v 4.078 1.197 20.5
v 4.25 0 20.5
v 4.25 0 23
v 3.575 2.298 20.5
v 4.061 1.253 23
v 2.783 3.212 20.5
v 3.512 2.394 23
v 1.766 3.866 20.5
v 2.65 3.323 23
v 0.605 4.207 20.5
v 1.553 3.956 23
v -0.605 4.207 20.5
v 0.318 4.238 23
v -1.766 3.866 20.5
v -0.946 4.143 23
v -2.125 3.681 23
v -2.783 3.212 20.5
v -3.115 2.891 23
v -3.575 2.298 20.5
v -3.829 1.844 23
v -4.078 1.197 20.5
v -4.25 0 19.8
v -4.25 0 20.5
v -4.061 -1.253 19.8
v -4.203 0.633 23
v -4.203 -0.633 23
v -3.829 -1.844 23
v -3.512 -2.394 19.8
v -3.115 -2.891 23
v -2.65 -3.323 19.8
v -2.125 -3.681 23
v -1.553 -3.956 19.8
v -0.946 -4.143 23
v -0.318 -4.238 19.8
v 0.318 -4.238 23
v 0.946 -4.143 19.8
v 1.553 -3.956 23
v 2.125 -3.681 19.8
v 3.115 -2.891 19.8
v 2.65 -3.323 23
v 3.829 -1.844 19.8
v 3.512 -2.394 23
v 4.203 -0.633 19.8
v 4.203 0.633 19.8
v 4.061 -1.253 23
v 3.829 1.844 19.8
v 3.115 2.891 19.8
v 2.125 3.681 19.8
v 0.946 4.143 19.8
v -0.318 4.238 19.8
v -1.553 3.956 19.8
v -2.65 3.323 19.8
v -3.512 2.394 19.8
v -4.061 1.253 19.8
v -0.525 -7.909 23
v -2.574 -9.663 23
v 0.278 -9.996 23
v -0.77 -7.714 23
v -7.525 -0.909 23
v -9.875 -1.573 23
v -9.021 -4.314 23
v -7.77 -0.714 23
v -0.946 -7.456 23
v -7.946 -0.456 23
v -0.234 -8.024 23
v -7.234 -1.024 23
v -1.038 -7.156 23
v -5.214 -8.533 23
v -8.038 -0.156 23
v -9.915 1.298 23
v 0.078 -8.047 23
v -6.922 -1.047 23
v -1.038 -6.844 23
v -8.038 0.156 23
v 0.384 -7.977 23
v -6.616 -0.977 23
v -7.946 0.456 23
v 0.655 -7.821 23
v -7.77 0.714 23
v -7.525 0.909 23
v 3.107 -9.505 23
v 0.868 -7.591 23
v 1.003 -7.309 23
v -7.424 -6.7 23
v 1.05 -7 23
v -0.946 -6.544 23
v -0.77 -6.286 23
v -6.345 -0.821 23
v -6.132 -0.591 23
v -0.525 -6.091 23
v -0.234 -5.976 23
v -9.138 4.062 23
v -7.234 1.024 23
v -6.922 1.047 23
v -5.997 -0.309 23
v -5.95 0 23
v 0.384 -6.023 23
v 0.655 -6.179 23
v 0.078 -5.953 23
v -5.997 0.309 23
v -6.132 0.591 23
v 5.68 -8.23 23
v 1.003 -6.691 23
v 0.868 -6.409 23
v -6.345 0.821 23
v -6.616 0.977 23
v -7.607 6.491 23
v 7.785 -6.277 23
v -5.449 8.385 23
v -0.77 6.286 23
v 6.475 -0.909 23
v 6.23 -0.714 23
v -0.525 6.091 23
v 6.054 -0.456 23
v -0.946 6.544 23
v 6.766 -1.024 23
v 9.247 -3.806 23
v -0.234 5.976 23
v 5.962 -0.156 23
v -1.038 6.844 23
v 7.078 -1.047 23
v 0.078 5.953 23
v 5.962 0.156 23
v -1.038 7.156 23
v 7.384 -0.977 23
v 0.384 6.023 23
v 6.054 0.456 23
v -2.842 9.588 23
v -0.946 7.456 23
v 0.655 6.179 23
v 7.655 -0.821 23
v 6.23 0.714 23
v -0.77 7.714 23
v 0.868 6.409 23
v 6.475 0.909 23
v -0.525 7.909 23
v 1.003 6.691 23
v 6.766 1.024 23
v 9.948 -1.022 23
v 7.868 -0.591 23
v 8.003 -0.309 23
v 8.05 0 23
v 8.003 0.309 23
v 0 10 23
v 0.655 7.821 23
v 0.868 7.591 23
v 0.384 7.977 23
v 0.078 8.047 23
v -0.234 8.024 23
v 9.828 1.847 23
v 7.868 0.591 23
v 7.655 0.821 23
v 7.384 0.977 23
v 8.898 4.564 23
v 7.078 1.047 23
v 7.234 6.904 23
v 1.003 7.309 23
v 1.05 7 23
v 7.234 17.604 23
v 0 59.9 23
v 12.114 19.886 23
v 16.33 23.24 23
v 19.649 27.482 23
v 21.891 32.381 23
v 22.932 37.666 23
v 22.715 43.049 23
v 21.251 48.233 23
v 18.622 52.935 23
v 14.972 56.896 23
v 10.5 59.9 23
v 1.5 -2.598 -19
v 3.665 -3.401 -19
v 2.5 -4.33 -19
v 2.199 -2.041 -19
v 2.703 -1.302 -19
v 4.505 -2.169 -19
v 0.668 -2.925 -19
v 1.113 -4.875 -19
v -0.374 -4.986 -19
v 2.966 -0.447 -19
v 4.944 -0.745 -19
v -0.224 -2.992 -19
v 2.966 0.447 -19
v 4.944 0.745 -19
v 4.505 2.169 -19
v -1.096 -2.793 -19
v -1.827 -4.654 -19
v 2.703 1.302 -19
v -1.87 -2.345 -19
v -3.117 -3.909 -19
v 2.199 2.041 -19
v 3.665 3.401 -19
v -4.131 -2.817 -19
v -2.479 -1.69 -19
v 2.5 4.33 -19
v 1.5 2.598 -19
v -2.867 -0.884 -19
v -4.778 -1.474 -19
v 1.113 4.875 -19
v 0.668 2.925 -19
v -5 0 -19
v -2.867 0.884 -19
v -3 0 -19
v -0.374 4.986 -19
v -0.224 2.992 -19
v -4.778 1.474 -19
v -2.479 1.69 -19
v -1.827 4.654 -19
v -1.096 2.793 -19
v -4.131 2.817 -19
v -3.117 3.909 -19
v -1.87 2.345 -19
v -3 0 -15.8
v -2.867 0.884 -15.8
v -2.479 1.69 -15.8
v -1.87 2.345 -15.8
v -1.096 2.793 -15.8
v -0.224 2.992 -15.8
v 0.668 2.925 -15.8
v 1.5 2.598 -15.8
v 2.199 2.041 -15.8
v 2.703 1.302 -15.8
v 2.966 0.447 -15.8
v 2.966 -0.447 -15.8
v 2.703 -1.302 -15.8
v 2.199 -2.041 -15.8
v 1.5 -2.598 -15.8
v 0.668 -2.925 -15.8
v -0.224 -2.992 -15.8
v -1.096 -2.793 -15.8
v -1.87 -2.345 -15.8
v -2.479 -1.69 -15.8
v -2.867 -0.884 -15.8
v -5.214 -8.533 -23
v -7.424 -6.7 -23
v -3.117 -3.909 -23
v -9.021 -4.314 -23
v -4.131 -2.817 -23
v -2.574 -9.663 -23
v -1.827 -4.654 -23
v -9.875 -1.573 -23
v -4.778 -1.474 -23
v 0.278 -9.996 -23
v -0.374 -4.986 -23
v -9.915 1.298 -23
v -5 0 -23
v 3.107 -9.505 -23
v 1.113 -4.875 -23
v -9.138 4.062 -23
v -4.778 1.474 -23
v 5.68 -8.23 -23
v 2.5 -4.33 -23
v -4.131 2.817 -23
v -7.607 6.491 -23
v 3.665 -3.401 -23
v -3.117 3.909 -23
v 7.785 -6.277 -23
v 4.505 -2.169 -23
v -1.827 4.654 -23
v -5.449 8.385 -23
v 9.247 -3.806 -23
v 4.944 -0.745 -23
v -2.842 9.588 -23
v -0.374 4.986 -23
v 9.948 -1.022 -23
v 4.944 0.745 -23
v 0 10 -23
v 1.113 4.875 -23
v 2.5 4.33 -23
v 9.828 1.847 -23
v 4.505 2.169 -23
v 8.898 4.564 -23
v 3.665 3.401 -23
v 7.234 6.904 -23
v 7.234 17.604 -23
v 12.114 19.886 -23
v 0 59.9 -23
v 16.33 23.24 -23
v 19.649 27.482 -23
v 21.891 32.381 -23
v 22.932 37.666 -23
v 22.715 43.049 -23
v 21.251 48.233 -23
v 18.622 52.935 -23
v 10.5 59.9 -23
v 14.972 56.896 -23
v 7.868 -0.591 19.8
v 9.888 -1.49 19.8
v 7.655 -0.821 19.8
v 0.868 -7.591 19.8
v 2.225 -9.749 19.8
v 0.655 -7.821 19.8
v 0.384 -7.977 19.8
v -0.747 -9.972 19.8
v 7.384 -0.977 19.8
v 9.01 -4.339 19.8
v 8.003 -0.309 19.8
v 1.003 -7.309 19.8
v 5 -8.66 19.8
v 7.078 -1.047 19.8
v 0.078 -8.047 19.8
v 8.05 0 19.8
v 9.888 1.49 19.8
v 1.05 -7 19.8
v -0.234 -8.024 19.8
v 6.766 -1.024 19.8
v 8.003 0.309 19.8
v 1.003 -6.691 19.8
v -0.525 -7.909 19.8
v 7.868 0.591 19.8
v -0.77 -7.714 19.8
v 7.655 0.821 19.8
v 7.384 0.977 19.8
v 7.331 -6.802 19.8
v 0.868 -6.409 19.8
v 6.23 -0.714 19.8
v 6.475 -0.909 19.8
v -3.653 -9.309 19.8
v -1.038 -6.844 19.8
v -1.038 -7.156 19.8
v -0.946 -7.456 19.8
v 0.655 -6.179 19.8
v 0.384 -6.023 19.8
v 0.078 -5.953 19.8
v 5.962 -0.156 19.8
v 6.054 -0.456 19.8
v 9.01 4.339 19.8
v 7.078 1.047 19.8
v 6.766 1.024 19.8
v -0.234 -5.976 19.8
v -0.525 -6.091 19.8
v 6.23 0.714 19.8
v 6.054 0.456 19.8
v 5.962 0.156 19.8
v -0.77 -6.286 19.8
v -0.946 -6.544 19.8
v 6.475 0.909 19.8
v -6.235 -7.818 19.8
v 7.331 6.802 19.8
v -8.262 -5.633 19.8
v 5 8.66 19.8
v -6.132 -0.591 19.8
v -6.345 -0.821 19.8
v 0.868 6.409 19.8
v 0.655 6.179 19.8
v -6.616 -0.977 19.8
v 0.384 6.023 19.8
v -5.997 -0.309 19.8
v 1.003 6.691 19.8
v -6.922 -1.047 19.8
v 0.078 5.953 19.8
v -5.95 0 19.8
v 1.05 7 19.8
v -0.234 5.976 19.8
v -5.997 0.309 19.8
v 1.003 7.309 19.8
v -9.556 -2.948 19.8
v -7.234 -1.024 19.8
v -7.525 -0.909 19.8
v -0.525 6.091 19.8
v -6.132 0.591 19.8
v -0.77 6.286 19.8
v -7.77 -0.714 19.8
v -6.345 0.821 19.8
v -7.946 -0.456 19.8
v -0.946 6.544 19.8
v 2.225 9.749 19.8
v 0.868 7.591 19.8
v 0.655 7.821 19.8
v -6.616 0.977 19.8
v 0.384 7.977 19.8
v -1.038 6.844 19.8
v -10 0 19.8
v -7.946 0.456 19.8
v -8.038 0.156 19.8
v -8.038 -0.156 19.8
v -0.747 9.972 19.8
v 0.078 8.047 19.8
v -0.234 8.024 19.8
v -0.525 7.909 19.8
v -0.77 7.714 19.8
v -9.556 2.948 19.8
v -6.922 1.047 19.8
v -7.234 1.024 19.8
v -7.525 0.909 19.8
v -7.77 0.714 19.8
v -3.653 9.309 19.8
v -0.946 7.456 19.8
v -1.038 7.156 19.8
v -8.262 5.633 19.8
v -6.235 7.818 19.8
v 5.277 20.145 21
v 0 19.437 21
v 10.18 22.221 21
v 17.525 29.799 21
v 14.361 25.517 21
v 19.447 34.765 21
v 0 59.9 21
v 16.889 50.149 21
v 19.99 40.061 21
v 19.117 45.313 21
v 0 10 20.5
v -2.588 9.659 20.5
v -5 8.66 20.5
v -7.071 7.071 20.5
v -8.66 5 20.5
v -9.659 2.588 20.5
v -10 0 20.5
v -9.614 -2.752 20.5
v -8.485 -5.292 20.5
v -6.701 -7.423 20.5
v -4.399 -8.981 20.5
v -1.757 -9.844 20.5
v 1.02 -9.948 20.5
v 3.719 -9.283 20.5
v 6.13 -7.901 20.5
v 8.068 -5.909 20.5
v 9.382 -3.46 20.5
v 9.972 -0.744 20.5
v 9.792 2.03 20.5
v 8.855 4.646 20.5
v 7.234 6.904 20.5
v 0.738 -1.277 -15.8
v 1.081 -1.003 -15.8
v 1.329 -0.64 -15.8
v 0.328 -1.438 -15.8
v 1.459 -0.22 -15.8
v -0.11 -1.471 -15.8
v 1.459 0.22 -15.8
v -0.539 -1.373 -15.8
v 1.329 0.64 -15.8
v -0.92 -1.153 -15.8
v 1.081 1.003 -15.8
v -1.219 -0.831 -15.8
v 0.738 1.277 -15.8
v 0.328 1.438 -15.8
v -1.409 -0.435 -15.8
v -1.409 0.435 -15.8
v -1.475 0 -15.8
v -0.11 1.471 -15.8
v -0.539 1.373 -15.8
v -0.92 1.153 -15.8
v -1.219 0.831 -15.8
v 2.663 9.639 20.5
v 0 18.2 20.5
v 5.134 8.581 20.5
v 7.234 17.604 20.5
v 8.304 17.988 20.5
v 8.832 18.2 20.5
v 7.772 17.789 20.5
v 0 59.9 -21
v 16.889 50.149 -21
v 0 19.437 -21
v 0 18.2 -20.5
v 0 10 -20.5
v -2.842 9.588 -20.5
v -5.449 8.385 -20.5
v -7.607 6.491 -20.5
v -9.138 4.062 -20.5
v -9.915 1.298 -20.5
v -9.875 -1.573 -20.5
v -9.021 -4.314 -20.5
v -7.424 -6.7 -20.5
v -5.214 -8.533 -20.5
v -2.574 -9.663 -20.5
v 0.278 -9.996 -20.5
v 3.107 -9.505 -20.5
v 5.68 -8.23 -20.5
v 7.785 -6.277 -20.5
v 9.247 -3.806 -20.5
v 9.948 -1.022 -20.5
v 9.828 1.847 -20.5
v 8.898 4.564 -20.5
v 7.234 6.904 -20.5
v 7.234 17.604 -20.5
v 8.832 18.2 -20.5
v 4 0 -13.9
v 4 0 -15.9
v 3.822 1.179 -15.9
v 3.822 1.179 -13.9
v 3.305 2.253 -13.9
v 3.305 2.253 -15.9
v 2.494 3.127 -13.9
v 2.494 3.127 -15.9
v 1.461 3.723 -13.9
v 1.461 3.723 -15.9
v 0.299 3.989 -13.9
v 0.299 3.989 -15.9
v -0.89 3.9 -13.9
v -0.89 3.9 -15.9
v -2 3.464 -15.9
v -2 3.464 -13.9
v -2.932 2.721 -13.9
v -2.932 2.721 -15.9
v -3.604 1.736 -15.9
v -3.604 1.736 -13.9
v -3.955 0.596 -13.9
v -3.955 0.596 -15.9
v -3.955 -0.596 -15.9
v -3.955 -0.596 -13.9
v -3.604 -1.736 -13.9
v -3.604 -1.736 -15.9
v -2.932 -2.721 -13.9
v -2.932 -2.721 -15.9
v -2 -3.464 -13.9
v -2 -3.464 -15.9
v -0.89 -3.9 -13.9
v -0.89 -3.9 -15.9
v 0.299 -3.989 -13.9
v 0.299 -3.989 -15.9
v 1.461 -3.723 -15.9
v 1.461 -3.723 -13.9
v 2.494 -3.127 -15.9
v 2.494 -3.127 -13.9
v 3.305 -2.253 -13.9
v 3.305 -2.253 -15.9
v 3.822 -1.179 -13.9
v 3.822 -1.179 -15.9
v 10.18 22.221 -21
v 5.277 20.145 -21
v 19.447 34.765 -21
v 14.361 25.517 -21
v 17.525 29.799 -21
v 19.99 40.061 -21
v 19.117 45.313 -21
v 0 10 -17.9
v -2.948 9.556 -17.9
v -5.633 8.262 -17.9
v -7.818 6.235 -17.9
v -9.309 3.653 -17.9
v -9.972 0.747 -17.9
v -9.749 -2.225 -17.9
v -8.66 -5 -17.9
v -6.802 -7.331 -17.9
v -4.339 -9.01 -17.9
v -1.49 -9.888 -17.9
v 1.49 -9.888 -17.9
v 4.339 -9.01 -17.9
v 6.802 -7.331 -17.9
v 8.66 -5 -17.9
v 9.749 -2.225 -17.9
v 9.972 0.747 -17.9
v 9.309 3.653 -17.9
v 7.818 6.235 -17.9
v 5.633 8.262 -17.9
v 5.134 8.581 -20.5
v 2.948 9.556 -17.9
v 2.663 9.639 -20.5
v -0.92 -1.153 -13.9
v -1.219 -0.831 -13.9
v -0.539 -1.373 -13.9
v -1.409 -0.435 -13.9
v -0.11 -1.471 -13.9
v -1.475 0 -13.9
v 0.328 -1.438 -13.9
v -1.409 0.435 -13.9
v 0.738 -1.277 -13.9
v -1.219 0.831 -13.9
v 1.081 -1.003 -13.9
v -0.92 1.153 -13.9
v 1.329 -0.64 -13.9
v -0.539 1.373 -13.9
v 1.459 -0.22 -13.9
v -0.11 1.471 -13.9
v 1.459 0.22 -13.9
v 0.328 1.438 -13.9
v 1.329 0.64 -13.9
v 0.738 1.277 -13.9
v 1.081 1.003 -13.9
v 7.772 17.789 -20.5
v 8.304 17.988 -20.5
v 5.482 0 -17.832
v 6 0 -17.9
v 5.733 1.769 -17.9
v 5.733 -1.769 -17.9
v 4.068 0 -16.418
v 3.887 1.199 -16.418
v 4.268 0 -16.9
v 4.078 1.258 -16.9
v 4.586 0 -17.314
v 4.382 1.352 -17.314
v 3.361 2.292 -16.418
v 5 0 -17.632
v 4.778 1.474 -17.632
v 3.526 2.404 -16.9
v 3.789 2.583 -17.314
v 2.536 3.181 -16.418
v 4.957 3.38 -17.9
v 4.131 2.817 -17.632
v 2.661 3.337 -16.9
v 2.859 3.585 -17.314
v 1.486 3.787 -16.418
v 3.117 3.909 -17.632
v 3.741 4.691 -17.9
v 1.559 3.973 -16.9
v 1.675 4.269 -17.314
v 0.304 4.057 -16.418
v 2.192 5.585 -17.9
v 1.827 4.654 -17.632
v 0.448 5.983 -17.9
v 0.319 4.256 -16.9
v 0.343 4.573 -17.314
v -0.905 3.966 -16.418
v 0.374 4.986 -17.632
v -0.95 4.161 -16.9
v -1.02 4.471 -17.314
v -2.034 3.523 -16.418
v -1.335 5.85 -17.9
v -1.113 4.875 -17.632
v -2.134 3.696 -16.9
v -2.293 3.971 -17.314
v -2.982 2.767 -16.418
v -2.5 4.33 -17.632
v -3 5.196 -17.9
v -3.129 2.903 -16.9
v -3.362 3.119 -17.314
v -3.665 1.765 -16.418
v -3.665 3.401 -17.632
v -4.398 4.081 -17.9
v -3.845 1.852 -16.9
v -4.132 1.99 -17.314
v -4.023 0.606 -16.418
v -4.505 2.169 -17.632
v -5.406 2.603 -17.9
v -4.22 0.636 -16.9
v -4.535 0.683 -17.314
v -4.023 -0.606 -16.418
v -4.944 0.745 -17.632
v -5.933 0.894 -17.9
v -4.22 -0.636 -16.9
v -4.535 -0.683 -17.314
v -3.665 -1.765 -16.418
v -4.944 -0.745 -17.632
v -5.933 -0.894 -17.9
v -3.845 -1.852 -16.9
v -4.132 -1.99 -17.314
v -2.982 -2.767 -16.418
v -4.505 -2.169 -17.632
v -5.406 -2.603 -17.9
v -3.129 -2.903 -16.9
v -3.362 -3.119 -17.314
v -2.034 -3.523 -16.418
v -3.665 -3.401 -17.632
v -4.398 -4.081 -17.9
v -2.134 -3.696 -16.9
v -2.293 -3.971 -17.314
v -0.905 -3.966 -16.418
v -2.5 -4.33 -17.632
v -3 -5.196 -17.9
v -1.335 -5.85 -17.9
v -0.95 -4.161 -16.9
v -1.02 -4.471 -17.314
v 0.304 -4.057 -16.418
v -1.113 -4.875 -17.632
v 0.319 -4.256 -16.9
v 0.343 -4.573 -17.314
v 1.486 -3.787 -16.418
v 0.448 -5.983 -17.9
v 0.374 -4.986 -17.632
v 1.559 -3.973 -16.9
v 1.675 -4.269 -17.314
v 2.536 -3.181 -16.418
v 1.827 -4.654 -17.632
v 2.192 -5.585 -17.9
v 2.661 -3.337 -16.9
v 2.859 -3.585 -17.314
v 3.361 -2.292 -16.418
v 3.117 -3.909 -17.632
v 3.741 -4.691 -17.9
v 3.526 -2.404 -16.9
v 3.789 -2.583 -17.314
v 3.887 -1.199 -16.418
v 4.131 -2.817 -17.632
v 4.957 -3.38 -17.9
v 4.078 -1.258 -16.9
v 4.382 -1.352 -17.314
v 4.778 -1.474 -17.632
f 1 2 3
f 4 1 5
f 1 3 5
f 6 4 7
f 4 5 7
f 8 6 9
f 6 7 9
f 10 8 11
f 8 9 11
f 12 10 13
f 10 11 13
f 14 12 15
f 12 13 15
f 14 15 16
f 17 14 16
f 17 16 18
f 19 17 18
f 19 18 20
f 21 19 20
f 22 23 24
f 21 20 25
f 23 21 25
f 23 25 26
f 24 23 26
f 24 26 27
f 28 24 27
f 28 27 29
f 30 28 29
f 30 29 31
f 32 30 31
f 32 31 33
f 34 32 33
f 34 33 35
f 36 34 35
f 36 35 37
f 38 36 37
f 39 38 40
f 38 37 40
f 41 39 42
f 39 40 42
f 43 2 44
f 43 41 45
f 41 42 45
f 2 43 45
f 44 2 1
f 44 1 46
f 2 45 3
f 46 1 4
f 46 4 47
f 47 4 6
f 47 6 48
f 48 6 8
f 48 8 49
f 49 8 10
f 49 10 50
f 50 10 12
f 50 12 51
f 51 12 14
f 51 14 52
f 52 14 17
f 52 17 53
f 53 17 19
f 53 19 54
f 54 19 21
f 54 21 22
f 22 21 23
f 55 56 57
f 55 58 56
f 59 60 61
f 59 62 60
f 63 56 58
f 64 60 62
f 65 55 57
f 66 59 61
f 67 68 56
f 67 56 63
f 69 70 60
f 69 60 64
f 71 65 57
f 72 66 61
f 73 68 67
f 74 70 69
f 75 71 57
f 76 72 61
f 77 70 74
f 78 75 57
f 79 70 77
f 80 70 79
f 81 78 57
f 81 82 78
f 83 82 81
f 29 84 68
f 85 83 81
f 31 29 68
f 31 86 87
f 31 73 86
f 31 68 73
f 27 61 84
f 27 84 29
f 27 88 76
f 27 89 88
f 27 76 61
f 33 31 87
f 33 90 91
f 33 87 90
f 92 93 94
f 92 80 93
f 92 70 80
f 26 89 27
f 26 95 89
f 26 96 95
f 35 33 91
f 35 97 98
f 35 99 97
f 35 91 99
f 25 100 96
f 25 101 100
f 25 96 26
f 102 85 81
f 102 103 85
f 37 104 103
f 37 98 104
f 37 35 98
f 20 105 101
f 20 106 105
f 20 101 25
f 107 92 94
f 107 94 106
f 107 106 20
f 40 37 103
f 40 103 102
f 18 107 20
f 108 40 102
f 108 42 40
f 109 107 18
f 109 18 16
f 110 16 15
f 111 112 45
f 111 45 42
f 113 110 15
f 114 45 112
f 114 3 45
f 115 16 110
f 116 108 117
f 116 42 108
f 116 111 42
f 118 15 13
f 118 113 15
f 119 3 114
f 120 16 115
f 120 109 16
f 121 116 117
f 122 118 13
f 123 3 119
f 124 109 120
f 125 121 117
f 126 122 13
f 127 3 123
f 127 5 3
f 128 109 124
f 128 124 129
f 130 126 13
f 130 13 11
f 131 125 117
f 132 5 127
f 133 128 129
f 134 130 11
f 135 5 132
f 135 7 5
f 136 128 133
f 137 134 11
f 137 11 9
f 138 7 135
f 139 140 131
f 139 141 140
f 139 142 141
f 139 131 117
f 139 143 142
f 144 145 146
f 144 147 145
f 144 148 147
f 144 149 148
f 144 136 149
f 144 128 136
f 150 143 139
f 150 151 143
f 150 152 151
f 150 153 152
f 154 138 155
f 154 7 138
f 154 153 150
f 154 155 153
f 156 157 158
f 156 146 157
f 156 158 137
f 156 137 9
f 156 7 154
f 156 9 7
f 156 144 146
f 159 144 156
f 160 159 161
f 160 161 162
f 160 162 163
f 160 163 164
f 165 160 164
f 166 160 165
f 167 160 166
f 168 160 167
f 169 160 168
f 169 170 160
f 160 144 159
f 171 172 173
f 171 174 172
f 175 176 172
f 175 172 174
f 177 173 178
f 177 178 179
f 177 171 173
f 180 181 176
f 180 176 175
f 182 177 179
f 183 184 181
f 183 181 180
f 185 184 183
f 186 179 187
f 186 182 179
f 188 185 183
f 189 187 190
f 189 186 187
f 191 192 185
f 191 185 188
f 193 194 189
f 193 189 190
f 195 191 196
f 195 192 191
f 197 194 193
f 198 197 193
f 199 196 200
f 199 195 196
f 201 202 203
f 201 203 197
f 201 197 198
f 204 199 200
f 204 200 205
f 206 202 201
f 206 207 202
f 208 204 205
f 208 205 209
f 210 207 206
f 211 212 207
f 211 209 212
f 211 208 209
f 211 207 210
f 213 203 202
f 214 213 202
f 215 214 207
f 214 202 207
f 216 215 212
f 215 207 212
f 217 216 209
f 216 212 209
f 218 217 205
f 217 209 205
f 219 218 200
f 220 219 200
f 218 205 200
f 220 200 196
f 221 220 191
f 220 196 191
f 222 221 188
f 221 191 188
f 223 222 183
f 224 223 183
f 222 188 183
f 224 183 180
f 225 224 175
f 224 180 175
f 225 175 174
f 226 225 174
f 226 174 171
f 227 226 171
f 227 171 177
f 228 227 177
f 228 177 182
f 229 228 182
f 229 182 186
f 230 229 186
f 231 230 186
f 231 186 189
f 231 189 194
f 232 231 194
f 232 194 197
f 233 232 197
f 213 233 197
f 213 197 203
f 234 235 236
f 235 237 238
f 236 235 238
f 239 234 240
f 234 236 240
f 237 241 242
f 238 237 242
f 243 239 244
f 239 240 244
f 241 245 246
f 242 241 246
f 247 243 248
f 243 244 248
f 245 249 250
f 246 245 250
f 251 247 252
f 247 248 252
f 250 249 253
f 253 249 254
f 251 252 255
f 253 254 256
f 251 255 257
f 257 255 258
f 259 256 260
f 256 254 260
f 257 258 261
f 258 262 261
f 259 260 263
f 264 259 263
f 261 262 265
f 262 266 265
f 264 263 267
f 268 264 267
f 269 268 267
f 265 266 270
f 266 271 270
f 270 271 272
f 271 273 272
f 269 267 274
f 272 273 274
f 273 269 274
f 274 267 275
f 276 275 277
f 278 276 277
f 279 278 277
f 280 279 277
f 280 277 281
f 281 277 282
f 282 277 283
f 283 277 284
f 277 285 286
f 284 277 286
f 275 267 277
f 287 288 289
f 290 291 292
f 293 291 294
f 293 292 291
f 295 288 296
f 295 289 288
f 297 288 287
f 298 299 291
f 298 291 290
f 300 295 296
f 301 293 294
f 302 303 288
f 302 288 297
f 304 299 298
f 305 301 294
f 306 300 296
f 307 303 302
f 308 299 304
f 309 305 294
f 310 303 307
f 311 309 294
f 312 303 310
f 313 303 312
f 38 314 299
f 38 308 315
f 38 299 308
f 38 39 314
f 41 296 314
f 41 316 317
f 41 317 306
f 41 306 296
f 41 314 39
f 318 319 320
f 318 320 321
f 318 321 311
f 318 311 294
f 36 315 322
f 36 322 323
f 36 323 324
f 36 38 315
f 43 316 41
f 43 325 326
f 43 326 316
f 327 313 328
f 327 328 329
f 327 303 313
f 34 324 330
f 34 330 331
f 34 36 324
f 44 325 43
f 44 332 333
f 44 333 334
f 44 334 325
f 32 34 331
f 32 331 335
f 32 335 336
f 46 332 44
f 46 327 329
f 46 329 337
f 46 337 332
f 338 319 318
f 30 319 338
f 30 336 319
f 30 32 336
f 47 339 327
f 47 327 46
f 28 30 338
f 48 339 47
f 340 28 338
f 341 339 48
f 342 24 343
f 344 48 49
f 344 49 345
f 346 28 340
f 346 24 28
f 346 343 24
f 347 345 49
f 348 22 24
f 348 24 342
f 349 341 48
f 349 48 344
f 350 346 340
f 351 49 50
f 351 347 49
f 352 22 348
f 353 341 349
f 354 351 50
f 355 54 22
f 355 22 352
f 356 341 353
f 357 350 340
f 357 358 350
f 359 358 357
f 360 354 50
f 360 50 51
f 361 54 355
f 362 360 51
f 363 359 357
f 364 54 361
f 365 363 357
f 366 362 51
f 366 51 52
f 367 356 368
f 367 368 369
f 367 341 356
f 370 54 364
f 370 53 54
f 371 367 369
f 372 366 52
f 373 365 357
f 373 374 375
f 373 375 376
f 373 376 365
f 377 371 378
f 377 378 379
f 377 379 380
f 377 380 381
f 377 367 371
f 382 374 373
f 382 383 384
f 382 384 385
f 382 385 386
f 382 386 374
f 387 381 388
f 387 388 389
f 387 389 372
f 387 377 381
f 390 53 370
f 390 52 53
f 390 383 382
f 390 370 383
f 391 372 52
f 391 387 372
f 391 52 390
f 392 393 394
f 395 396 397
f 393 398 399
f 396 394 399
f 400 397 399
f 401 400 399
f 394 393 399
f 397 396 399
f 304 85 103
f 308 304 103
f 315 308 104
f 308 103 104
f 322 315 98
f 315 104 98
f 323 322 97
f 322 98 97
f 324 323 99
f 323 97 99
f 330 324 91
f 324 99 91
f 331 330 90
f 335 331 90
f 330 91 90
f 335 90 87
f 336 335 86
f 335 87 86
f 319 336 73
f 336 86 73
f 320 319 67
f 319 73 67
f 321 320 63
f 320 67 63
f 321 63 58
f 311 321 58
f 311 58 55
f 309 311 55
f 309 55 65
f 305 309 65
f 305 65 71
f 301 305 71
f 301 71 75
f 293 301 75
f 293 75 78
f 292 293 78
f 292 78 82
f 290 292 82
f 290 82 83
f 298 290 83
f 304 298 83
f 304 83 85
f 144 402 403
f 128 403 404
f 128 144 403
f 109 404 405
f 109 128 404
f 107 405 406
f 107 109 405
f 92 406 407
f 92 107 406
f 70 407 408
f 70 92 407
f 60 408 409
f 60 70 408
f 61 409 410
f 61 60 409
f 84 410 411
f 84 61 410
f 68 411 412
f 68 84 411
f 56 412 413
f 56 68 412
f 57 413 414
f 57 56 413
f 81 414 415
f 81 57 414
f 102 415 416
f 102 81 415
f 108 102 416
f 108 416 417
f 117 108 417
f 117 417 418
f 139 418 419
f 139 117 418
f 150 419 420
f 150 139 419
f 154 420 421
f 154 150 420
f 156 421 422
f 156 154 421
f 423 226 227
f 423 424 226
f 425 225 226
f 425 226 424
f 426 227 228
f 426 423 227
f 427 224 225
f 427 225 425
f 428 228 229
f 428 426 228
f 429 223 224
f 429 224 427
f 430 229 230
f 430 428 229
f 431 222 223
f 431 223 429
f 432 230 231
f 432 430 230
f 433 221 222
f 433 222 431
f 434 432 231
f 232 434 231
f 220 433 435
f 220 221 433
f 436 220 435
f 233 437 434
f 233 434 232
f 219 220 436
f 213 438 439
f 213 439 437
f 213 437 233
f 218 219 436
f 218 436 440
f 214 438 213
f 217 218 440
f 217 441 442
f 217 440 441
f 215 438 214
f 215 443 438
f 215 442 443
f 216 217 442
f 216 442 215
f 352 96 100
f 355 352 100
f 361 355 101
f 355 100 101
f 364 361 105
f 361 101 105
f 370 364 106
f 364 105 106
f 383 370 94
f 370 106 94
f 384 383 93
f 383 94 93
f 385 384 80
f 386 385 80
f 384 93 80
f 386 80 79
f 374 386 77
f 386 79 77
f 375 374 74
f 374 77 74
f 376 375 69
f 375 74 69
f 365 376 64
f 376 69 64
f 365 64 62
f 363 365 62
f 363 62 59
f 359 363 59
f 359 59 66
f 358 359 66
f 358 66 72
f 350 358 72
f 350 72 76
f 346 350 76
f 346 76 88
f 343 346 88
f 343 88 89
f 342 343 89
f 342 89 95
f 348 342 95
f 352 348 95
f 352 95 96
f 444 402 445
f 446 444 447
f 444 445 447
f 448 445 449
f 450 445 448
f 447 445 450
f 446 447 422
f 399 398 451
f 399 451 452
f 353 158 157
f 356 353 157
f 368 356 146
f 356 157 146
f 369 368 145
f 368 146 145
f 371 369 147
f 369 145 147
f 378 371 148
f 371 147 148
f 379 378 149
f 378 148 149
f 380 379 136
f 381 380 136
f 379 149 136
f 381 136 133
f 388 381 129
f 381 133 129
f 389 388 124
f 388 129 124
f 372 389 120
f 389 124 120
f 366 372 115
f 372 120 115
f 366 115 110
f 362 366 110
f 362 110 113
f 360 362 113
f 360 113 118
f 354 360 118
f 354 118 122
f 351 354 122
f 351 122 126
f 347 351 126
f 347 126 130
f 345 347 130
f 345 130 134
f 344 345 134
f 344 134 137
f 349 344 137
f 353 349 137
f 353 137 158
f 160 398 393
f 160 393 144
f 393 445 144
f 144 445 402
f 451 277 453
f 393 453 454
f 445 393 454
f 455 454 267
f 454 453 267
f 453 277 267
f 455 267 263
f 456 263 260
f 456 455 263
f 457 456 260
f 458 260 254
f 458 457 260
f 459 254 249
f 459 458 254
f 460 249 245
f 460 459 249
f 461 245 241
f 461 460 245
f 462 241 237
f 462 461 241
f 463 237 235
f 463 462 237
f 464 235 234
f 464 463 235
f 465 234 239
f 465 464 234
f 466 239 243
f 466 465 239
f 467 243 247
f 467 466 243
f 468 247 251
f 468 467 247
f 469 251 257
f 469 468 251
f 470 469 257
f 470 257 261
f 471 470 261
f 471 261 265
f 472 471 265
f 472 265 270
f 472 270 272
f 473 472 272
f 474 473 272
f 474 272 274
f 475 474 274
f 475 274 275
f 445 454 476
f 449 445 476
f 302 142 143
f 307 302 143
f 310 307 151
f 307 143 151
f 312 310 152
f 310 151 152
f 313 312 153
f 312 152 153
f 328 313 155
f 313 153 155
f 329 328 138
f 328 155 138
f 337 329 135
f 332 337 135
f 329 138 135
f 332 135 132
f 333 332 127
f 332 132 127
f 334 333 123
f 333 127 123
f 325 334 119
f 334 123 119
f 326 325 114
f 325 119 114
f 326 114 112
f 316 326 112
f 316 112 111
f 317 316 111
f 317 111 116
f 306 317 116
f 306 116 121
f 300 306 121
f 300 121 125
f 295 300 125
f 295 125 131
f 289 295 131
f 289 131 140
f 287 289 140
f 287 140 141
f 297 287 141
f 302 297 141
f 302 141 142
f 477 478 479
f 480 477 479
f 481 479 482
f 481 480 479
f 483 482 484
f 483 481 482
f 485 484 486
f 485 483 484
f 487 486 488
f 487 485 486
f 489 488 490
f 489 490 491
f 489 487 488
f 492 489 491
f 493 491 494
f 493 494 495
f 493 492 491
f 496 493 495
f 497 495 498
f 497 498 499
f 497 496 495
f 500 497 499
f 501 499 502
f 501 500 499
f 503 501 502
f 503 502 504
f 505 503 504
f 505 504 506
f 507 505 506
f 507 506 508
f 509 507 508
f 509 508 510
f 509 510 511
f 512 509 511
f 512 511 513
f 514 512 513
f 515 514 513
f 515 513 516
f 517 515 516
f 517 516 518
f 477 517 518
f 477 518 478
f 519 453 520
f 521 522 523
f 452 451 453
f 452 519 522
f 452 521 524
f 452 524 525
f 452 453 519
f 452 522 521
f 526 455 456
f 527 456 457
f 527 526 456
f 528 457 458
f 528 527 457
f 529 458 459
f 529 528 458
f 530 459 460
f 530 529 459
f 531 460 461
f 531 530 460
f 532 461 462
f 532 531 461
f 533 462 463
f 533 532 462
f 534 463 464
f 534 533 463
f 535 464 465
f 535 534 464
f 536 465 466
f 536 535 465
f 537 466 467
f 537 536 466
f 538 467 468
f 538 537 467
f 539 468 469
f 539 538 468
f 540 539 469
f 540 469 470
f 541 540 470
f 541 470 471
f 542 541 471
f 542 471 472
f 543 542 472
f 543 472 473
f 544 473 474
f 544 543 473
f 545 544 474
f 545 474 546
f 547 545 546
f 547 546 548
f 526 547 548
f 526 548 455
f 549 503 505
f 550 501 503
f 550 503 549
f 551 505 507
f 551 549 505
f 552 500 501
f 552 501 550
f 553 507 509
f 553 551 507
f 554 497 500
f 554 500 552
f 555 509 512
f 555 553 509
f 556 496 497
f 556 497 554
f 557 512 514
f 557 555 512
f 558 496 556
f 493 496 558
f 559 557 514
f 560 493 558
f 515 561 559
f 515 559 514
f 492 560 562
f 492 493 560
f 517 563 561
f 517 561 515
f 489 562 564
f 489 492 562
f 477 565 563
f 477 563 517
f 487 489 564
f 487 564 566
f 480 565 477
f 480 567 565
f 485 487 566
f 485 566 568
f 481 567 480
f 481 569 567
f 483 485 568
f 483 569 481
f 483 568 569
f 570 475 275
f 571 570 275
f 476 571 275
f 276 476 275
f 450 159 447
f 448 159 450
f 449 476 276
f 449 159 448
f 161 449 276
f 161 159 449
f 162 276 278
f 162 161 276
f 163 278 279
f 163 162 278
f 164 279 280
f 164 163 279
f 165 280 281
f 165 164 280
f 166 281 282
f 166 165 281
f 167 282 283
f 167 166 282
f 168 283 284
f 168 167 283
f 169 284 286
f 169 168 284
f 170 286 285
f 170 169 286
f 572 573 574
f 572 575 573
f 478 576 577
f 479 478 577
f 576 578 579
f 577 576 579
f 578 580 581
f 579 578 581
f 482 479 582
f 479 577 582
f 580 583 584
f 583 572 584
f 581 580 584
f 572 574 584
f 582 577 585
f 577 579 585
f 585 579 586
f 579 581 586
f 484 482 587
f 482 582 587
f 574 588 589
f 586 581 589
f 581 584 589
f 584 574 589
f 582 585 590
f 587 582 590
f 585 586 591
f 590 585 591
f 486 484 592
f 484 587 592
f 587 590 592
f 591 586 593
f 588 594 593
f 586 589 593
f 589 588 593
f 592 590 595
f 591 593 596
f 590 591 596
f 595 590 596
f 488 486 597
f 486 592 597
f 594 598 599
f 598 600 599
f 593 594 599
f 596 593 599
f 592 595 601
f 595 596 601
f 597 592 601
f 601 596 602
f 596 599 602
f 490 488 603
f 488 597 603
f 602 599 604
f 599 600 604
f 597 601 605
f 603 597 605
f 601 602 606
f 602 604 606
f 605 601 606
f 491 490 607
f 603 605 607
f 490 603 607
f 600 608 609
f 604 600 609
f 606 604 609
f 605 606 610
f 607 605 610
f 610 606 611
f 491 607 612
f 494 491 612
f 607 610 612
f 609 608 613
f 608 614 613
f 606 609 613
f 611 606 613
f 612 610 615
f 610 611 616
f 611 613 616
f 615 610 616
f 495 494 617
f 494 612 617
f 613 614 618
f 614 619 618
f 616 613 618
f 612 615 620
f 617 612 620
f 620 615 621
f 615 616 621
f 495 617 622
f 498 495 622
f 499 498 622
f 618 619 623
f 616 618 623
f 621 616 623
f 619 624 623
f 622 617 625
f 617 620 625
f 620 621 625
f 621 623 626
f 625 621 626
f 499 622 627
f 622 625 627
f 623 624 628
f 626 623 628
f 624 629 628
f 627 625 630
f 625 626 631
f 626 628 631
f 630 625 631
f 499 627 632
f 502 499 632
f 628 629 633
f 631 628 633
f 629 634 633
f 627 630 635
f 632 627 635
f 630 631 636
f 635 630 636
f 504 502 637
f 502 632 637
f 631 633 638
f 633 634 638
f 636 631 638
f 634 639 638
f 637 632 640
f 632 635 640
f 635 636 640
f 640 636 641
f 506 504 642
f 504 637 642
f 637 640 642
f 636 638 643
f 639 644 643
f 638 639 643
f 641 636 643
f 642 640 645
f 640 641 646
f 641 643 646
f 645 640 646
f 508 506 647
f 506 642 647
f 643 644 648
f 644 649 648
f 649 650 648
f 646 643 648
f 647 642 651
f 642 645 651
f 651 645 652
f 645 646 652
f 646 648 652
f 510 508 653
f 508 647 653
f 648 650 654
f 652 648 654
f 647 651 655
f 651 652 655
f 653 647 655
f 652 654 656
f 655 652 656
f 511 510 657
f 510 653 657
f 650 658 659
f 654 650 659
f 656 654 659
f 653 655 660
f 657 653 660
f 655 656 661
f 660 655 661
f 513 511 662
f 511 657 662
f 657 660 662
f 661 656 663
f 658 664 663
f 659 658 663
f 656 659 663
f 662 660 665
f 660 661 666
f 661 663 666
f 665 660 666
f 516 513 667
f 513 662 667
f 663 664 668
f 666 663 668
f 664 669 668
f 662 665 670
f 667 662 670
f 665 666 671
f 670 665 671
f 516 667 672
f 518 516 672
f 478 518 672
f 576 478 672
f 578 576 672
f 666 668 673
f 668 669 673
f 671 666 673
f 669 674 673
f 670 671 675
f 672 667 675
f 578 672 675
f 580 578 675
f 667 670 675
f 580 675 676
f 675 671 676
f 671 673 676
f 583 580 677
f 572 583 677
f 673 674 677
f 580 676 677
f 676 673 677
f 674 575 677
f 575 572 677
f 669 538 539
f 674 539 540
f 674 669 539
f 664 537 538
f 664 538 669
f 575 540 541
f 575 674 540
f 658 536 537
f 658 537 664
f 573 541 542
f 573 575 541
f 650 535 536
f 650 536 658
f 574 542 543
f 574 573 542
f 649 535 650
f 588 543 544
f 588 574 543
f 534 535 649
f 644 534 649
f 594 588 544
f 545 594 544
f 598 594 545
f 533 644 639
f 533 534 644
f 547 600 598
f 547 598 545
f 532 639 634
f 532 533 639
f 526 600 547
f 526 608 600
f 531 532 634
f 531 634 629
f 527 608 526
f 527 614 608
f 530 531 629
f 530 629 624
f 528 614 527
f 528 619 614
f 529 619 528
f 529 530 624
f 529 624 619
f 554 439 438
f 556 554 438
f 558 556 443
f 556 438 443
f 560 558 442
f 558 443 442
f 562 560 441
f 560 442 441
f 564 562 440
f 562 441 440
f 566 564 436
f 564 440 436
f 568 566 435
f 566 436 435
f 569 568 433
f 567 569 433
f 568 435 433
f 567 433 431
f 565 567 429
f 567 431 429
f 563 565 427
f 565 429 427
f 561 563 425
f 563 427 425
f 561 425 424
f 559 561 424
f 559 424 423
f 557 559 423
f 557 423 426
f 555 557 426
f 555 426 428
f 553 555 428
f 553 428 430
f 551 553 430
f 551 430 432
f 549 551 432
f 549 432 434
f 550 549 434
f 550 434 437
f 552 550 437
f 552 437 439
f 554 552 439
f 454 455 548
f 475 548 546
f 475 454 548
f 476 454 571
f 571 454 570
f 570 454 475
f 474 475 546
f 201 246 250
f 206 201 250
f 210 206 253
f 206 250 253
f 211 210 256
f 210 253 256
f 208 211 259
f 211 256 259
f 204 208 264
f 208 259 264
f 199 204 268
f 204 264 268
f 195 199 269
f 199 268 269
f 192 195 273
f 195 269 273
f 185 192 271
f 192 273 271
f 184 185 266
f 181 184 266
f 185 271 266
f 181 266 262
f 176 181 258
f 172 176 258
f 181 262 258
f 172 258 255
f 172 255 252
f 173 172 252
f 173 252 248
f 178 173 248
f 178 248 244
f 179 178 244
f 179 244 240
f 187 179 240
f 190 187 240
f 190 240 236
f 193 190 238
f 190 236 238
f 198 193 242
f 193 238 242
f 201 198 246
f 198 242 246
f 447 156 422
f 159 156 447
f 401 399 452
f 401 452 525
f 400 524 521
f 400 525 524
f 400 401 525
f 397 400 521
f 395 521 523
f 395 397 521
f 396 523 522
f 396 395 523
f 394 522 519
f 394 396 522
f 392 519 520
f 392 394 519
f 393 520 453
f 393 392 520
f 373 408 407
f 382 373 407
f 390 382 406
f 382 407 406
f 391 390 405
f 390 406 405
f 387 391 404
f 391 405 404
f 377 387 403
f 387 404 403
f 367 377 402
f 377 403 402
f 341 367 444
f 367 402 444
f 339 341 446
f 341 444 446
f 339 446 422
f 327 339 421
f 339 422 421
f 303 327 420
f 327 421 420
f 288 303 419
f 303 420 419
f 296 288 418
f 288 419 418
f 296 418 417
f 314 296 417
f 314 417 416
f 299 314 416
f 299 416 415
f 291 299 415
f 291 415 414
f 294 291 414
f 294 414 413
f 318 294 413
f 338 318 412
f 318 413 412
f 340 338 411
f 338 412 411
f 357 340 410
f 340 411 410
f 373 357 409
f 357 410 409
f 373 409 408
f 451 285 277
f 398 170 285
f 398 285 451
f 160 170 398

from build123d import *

# Parameters (mm, degrees)
BOSS_EXTRUDE1_DEPTH = 23
BOSS_EXTRUDE3_DEPTH = 2
SKETCH4_W           = 20
SKETCH4_H           = 41
CUT_EXTRUDE1_DEPTH  = 18.2
SKETCH5_R           = 10
SKETCH5_R_2         = 4.25
BOSS_EXTRUDE4_DEPTH = 0.7
CUT_EXTRUDE2_REACH  = 80.949
SKETCH6_R           = 1.05
SKETCH6_R_2         = 4.25
BOSS_EXTRUDE5_START = 6.1
SKETCH7_R           = 10
BOSS_EXTRUDE5_DEPTH = 6.1
SKETCH11_R          = 4
BOSS_EXTRUDE6_DEPTH = 0.5
SKETCH10_R          = 3
CUT_EXTRUDE4_DEPTH  = 7.2
CUT_EXTRUDE3_REACH  = 80.949
SKETCH9_R           = 1.475
SKETCH12_R          = 5
CUT_EXTRUDE5_DEPTH  = 4
SKETCH13_R          = 10
SKETCH13_R_2        = 4
CUT_EXTRUDE6_DEPTH  = 3.5
FILLET2_R           = 2


with BuildPart() as part:
    # Sketch1 → Boss-Extrude1 (new, symmetric)
    with BuildSketch(Plane.XY):
        with BuildLine():
            Line((0, 59.9), (16.889174661, 50.149030463))
            ThreePointArc((16.889174661, 50.149030463), (17.524957173, 29.799404984), (0, 19.43661807))
            Line((0, 19.43661807), (0, 10))
            ThreePointArc((0, 10), (-3.934485272, -9.193466465), (7.234311682, 6.903965128))
            Line((7.234311682, 6.903965128), (7.234311682, 17.603965128))
            ThreePointArc((7.234311682, 17.603965128), (22.931748607, 37.666051544), (10.5, 59.9))
            Line((10.5, 59.9), (0, 59.9))
        make_face()
    extrude(amount=BOSS_EXTRUDE1_DEPTH, both=True)

    # Sketch3 → Boss-Extrude3 (add)
    with BuildSketch(Plane.XY.offset(23)):
        with BuildLine():
            Line((0, 59.9), (0, 19.43661807))
            ThreePointArc((0, 19.43661807), (17.524957173, 29.799404984), (16.889174661, 50.149030463))
            Line((16.889174661, 50.149030463), (0, 59.9))
        make_face()
    boss_extrude3 = extrude(amount=-BOSS_EXTRUDE3_DEPTH)

    # Mirror1: Boss-Extrude3 across plane
    add(boss_extrude3.mirror(Plane.XY))

    # Sketch4 → Cut-Extrude1 (cut, symmetric)
    with BuildSketch(Plane(origin=(0, 0, 0), x_dir=(1, 0, 0), z_dir=(0, 1, 0))):
        Rectangle(SKETCH4_W, SKETCH4_H)
    extrude(amount=CUT_EXTRUDE1_DEPTH, both=True, mode=Mode.SUBTRACT)

    # Sketch5 → Boss-Extrude4 (add)
    with BuildSketch(Plane(origin=(0, 0, 20.5), x_dir=(-1, 0, 0), z_dir=(0, 0, -1))):
        Circle(SKETCH5_R)
        Circle(SKETCH5_R_2, mode=Mode.SUBTRACT)
    extrude(amount=BOSS_EXTRUDE4_DEPTH)

    # Sketch6 → Cut-Extrude2 (cut, up to next)
    with BuildSketch(Plane.XY.offset(23), mode=Mode.PRIVATE) as cut_extrude2_sk1:
        with Locations((0, 7)):
            Circle(SKETCH6_R)
    cut_extrude2_tool1 = extrude(cut_extrude2_sk1.sketch, amount=-CUT_EXTRUDE2_REACH, mode=Mode.PRIVATE) & part.part
    # Sketch6 → Cut-Extrude2 (cut, up to next)
    with BuildSketch(Plane.XY.offset(23), mode=Mode.PRIVATE) as cut_extrude2_sk2:
        with Locations((7, 0)):
            Circle(SKETCH6_R)
    cut_extrude2_tool2 = extrude(cut_extrude2_sk2.sketch, amount=-CUT_EXTRUDE2_REACH, mode=Mode.PRIVATE) & part.part
    # Sketch6 → Cut-Extrude2 (cut, up to next)
    with BuildSketch(Plane.XY.offset(23), mode=Mode.PRIVATE) as cut_extrude2_sk3:
        with Locations((0, -7)):
            Circle(SKETCH6_R)
    cut_extrude2_tool3 = extrude(cut_extrude2_sk3.sketch, amount=-CUT_EXTRUDE2_REACH, mode=Mode.PRIVATE) & part.part
    # Sketch6 → Cut-Extrude2 (cut, up to next)
    with BuildSketch(Plane.XY.offset(23), mode=Mode.PRIVATE) as cut_extrude2_sk4:
        with Locations((-7, 0)):
            Circle(SKETCH6_R)
    cut_extrude2_tool4 = extrude(cut_extrude2_sk4.sketch, amount=-CUT_EXTRUDE2_REACH, mode=Mode.PRIVATE) & part.part
    # Sketch6 → Cut-Extrude2 (cut, up to next)
    with BuildSketch(Plane.XY.offset(23), mode=Mode.PRIVATE) as cut_extrude2_sk5:
        Circle(SKETCH6_R_2)
    cut_extrude2_tool5 = extrude(cut_extrude2_sk5.sketch, amount=-CUT_EXTRUDE2_REACH, mode=Mode.PRIVATE) & part.part
    add(cut_extrude2_tool1.solids().sort_by_distance((0, 7, 23))[0], mode=Mode.SUBTRACT)
    add(cut_extrude2_tool2.solids().sort_by_distance((7, 0, 23))[0], mode=Mode.SUBTRACT)
    add(cut_extrude2_tool3.solids().sort_by_distance((0, -7, 23))[0], mode=Mode.SUBTRACT)
    add(cut_extrude2_tool4.solids().sort_by_distance((-7, 0, 23))[0], mode=Mode.SUBTRACT)
    add(cut_extrude2_tool5.solids().sort_by_distance((0, 0, 23))[0], mode=Mode.SUBTRACT)

    # Sketch7 → Boss-Extrude5 (add)
    with BuildSketch(Plane.XY.offset(-20.5).offset(BOSS_EXTRUDE5_START)):
        with Locations(Location((0, 0, 0), (0, 0, 90))):
            Circle(SKETCH7_R)
    extrude(amount=-BOSS_EXTRUDE5_DEPTH)

    # Sketch11 → Boss-Extrude6 (add)
    with BuildSketch(Plane.XY.offset(-14.4)):
        Circle(SKETCH11_R)
    extrude(amount=BOSS_EXTRUDE6_DEPTH)

    # Sketch10 → Cut-Extrude4 (cut)
    with BuildSketch(Plane(origin=(0, 0, -23), x_dir=(-1, 0, 0), z_dir=(0, 0, -1))):
        Circle(SKETCH10_R)
    extrude(amount=-CUT_EXTRUDE4_DEPTH, mode=Mode.SUBTRACT)

    # Sketch9 → Cut-Extrude3 (cut, up to next)
    with BuildSketch(Plane(origin=(0, 0, -23), x_dir=(-1, 0, 0), z_dir=(0, 0, -1)), mode=Mode.PRIVATE) as cut_extrude3_sk1:
        Circle(SKETCH9_R)
    cut_extrude3_tool1 = extrude(cut_extrude3_sk1.sketch, amount=-CUT_EXTRUDE3_REACH, mode=Mode.PRIVATE) & part.part
    add(cut_extrude3_tool1.solids().sort_by_distance((0, 0, -23))[0], mode=Mode.SUBTRACT)

    # Sketch12 → Cut-Extrude5 (cut)
    with BuildSketch(Plane(origin=(0, 0, -23), x_dir=(-1, 0, 0), z_dir=(0, 0, -1))):
        Circle(SKETCH12_R)
    extrude(amount=-CUT_EXTRUDE5_DEPTH, mode=Mode.SUBTRACT)

    # Sketch13 → Cut-Extrude6 (cut)
    with BuildSketch(Plane.XY.offset(-14.4)):
        with Locations(Location((0, 0, 0), (0, 0, 90))):
            Circle(SKETCH13_R)
        Circle(SKETCH13_R_2, mode=Mode.SUBTRACT)
    extrude(amount=-CUT_EXTRUDE6_DEPTH, mode=Mode.SUBTRACT)

    # Fillet2
    fillet2_edges = [part.edges().sort_by_distance(p)[0] for p in [
        (-4, 0, -17.9),
    ]]
    fillet(fillet2_edges, radius=FILLET2_R)


solid = part.part
